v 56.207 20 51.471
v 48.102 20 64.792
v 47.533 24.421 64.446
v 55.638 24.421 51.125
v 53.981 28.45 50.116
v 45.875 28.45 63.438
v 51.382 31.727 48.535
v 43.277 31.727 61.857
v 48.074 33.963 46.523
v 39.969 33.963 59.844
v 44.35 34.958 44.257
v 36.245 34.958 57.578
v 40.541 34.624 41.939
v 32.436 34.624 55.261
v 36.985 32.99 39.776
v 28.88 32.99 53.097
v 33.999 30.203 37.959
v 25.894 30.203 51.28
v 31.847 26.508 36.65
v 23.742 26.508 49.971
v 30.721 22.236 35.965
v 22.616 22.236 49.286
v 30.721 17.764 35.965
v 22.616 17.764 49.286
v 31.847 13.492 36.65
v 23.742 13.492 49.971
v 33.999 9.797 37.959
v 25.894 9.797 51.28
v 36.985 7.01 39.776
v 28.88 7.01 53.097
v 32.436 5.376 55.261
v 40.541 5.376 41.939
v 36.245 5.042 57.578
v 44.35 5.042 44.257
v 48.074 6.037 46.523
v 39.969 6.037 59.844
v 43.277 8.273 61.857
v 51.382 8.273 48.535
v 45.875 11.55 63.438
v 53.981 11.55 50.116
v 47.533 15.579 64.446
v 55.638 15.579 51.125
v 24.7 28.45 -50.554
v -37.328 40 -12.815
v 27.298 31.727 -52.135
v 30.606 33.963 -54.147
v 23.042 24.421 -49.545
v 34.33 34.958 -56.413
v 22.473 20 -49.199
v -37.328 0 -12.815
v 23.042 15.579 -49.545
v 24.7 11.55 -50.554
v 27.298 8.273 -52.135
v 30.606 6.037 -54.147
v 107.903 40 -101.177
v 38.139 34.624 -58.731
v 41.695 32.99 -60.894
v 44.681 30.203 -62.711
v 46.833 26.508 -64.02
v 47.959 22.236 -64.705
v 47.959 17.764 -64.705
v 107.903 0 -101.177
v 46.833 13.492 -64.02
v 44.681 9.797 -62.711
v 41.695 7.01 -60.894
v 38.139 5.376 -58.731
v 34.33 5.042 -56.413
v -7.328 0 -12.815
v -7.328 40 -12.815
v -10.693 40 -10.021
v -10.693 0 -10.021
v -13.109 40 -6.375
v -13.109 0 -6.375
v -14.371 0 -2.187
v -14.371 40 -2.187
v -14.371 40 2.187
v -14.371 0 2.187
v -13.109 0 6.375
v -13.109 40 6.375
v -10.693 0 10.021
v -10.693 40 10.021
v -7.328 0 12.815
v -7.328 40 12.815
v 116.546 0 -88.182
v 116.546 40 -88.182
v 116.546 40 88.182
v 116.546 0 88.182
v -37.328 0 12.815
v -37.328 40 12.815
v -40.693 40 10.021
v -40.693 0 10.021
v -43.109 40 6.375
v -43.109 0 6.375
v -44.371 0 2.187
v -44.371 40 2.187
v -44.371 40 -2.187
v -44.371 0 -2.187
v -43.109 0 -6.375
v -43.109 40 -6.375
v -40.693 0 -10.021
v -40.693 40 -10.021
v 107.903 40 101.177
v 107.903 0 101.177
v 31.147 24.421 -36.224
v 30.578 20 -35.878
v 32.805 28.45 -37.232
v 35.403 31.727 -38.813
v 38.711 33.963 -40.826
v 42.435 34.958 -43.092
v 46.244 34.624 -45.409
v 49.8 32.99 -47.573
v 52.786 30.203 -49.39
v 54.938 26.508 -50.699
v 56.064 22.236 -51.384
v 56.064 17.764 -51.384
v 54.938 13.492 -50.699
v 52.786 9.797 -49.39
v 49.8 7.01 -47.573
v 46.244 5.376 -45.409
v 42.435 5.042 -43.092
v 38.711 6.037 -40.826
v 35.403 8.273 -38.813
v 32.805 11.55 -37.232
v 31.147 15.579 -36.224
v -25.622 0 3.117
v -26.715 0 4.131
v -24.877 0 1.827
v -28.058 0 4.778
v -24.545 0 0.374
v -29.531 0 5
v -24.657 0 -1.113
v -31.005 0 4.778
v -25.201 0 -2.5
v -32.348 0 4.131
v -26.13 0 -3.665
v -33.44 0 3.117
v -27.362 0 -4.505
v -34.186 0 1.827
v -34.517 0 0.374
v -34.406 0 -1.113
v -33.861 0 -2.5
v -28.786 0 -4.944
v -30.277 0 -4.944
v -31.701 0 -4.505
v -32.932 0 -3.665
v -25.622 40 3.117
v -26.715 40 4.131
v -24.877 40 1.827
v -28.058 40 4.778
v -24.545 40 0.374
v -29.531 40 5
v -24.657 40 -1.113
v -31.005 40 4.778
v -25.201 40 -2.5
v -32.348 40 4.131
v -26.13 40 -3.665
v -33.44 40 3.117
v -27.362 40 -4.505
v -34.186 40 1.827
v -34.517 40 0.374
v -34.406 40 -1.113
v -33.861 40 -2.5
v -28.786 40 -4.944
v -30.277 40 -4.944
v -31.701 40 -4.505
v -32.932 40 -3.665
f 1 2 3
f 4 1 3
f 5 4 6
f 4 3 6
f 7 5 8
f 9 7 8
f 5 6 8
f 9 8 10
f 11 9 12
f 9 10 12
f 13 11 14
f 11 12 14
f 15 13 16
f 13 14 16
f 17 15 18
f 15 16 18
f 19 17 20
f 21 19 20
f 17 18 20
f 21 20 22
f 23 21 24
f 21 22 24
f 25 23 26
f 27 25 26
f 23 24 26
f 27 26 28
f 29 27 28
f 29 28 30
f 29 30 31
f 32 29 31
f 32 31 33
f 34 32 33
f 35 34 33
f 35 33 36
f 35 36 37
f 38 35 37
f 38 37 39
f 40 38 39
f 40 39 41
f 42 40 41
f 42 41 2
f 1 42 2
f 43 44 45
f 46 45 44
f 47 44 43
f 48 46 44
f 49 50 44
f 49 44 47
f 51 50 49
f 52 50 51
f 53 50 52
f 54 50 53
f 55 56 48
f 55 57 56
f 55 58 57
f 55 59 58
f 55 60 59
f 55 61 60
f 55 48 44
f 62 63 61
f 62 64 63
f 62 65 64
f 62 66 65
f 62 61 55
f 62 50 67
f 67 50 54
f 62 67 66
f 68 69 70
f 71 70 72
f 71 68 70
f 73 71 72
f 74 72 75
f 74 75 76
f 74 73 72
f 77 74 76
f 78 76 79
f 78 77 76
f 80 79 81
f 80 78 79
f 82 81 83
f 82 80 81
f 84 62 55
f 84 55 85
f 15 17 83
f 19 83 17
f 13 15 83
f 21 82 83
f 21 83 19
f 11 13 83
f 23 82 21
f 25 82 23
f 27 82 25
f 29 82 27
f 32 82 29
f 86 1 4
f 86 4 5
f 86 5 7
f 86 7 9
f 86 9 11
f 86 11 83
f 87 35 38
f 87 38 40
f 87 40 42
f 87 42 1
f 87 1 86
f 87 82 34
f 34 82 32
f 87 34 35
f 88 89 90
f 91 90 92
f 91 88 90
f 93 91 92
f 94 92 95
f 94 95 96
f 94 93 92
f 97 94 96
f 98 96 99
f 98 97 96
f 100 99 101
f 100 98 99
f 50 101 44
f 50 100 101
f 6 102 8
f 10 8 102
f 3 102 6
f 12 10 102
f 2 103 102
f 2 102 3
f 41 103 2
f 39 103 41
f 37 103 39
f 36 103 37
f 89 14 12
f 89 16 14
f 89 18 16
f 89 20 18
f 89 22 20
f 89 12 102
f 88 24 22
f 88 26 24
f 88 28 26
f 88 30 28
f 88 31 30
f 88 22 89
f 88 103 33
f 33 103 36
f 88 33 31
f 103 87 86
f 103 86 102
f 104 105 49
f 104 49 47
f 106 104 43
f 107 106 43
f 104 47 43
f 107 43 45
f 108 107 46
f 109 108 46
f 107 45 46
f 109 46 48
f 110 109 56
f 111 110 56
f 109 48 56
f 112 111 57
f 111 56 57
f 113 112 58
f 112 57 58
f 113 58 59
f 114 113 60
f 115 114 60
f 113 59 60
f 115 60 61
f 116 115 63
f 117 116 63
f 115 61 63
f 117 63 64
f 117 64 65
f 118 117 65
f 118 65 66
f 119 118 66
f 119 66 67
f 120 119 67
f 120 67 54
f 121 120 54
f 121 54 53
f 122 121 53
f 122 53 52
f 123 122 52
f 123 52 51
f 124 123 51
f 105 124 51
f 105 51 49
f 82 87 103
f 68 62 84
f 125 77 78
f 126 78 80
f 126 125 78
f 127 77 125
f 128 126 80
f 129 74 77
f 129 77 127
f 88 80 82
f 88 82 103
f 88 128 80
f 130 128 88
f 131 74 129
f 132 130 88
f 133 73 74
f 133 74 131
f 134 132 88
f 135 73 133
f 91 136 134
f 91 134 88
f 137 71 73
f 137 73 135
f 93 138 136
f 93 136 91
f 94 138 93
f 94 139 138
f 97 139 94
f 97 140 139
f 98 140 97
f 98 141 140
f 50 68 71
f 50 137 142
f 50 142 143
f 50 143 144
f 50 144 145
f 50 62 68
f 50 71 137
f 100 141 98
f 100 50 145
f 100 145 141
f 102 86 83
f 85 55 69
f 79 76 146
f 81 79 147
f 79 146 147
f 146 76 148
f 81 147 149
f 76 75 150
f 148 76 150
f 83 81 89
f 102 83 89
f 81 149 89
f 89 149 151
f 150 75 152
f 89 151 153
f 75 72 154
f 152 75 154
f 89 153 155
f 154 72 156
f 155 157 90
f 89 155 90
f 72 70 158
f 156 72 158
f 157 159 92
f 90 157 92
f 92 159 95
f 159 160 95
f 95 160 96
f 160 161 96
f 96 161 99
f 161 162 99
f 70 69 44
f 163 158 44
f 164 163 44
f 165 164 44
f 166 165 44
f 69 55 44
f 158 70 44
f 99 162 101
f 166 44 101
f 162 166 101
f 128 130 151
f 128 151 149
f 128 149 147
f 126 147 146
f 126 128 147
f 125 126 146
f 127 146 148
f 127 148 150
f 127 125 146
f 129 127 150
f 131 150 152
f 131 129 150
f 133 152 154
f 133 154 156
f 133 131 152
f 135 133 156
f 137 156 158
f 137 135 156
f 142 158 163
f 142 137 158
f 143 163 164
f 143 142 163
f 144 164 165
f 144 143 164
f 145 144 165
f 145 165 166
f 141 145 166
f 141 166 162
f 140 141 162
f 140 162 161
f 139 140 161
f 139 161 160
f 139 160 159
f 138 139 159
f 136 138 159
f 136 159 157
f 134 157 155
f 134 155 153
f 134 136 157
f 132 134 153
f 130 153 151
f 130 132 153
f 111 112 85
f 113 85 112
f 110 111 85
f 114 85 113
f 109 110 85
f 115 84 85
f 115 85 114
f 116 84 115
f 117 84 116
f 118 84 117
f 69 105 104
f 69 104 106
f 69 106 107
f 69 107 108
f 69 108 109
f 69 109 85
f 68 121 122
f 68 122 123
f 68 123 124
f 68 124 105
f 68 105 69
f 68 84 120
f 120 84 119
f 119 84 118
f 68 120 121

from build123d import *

# Parameters (mm, degrees)
SKETCH1_R           = 5
BOSS_EXTRUDE1_DEPTH = 40
SKETCH2_R           = 15
CUT_EXTRUDE1_DEPTH  = 40
SKETCH3_R           = 15
CUT_EXTRUDE2_DEPTH  = 40


with BuildPart() as part:
    # Sketch1 → Boss-Extrude1 (new body)
    with BuildSketch(Plane(origin=(0, 0, 0), x_dir=(1, 0, 0), z_dir=(0, 1, 0))):
        with BuildLine():
            Line((-37.328010775, 12.814518474), (107.903198598, 101.176817132))
            Line((107.903198598, 101.176817132), (116.545667808, 88.182361447))
            Line((116.545667808, 88.182361447), (-7.328010775, 12.814518474))
            ThreePointArc((-7.328010775, 12.814518474), (-14.531337364, 0), (-7.328010775, -12.814518474))
            Line((-7.328010775, -12.814518474), (116.545667808, -88.182361447))
            Line((116.545667808, -88.182361447), (107.903198598, -101.176817132))
            Line((107.903198598, -101.176817132), (-37.328010775, -12.814518474))
            ThreePointArc((-37.328010775, -12.814518474), (-44.531337364, 0), (-37.328010775, 12.814518474))
        make_face()
        with Locations(Location((-29.531337364, 0, 0), (0, 0, 270))):
            Circle(SKETCH1_R, mode=Mode.SUBTRACT)
    extrude(amount=BOSS_EXTRUDE1_DEPTH)

    # Sketch2 → Cut-Extrude1 (cut)
    with BuildSketch(Plane(origin=(-15.775137276, 0, 25.927825547), x_dir=(0.8543012316036261, 0, 0.5197782274013867), z_dir=(-0.5197782274013867, 0, 0.8543012316036263))):
        with Locations((59.771342119, 20)):
            Circle(SKETCH2_R)
    extrude(amount=-CUT_EXTRUDE1_DEPTH, mode=Mode.SUBTRACT)

    # Sketch3 → Cut-Extrude2 (cut)
    with BuildSketch(Plane(origin=(-15.775137276, 0, -25.927825547), x_dir=(-0.8543012316036261, 0, 0.5197782274013867), z_dir=(-0.5197782274013867, 0, -0.8543012316036263))):
        with Locations((-59.771342119, 20)):
            Circle(SKETCH3_R)
    extrude(amount=-CUT_EXTRUDE2_DEPTH, mode=Mode.SUBTRACT)


solid = part.part
